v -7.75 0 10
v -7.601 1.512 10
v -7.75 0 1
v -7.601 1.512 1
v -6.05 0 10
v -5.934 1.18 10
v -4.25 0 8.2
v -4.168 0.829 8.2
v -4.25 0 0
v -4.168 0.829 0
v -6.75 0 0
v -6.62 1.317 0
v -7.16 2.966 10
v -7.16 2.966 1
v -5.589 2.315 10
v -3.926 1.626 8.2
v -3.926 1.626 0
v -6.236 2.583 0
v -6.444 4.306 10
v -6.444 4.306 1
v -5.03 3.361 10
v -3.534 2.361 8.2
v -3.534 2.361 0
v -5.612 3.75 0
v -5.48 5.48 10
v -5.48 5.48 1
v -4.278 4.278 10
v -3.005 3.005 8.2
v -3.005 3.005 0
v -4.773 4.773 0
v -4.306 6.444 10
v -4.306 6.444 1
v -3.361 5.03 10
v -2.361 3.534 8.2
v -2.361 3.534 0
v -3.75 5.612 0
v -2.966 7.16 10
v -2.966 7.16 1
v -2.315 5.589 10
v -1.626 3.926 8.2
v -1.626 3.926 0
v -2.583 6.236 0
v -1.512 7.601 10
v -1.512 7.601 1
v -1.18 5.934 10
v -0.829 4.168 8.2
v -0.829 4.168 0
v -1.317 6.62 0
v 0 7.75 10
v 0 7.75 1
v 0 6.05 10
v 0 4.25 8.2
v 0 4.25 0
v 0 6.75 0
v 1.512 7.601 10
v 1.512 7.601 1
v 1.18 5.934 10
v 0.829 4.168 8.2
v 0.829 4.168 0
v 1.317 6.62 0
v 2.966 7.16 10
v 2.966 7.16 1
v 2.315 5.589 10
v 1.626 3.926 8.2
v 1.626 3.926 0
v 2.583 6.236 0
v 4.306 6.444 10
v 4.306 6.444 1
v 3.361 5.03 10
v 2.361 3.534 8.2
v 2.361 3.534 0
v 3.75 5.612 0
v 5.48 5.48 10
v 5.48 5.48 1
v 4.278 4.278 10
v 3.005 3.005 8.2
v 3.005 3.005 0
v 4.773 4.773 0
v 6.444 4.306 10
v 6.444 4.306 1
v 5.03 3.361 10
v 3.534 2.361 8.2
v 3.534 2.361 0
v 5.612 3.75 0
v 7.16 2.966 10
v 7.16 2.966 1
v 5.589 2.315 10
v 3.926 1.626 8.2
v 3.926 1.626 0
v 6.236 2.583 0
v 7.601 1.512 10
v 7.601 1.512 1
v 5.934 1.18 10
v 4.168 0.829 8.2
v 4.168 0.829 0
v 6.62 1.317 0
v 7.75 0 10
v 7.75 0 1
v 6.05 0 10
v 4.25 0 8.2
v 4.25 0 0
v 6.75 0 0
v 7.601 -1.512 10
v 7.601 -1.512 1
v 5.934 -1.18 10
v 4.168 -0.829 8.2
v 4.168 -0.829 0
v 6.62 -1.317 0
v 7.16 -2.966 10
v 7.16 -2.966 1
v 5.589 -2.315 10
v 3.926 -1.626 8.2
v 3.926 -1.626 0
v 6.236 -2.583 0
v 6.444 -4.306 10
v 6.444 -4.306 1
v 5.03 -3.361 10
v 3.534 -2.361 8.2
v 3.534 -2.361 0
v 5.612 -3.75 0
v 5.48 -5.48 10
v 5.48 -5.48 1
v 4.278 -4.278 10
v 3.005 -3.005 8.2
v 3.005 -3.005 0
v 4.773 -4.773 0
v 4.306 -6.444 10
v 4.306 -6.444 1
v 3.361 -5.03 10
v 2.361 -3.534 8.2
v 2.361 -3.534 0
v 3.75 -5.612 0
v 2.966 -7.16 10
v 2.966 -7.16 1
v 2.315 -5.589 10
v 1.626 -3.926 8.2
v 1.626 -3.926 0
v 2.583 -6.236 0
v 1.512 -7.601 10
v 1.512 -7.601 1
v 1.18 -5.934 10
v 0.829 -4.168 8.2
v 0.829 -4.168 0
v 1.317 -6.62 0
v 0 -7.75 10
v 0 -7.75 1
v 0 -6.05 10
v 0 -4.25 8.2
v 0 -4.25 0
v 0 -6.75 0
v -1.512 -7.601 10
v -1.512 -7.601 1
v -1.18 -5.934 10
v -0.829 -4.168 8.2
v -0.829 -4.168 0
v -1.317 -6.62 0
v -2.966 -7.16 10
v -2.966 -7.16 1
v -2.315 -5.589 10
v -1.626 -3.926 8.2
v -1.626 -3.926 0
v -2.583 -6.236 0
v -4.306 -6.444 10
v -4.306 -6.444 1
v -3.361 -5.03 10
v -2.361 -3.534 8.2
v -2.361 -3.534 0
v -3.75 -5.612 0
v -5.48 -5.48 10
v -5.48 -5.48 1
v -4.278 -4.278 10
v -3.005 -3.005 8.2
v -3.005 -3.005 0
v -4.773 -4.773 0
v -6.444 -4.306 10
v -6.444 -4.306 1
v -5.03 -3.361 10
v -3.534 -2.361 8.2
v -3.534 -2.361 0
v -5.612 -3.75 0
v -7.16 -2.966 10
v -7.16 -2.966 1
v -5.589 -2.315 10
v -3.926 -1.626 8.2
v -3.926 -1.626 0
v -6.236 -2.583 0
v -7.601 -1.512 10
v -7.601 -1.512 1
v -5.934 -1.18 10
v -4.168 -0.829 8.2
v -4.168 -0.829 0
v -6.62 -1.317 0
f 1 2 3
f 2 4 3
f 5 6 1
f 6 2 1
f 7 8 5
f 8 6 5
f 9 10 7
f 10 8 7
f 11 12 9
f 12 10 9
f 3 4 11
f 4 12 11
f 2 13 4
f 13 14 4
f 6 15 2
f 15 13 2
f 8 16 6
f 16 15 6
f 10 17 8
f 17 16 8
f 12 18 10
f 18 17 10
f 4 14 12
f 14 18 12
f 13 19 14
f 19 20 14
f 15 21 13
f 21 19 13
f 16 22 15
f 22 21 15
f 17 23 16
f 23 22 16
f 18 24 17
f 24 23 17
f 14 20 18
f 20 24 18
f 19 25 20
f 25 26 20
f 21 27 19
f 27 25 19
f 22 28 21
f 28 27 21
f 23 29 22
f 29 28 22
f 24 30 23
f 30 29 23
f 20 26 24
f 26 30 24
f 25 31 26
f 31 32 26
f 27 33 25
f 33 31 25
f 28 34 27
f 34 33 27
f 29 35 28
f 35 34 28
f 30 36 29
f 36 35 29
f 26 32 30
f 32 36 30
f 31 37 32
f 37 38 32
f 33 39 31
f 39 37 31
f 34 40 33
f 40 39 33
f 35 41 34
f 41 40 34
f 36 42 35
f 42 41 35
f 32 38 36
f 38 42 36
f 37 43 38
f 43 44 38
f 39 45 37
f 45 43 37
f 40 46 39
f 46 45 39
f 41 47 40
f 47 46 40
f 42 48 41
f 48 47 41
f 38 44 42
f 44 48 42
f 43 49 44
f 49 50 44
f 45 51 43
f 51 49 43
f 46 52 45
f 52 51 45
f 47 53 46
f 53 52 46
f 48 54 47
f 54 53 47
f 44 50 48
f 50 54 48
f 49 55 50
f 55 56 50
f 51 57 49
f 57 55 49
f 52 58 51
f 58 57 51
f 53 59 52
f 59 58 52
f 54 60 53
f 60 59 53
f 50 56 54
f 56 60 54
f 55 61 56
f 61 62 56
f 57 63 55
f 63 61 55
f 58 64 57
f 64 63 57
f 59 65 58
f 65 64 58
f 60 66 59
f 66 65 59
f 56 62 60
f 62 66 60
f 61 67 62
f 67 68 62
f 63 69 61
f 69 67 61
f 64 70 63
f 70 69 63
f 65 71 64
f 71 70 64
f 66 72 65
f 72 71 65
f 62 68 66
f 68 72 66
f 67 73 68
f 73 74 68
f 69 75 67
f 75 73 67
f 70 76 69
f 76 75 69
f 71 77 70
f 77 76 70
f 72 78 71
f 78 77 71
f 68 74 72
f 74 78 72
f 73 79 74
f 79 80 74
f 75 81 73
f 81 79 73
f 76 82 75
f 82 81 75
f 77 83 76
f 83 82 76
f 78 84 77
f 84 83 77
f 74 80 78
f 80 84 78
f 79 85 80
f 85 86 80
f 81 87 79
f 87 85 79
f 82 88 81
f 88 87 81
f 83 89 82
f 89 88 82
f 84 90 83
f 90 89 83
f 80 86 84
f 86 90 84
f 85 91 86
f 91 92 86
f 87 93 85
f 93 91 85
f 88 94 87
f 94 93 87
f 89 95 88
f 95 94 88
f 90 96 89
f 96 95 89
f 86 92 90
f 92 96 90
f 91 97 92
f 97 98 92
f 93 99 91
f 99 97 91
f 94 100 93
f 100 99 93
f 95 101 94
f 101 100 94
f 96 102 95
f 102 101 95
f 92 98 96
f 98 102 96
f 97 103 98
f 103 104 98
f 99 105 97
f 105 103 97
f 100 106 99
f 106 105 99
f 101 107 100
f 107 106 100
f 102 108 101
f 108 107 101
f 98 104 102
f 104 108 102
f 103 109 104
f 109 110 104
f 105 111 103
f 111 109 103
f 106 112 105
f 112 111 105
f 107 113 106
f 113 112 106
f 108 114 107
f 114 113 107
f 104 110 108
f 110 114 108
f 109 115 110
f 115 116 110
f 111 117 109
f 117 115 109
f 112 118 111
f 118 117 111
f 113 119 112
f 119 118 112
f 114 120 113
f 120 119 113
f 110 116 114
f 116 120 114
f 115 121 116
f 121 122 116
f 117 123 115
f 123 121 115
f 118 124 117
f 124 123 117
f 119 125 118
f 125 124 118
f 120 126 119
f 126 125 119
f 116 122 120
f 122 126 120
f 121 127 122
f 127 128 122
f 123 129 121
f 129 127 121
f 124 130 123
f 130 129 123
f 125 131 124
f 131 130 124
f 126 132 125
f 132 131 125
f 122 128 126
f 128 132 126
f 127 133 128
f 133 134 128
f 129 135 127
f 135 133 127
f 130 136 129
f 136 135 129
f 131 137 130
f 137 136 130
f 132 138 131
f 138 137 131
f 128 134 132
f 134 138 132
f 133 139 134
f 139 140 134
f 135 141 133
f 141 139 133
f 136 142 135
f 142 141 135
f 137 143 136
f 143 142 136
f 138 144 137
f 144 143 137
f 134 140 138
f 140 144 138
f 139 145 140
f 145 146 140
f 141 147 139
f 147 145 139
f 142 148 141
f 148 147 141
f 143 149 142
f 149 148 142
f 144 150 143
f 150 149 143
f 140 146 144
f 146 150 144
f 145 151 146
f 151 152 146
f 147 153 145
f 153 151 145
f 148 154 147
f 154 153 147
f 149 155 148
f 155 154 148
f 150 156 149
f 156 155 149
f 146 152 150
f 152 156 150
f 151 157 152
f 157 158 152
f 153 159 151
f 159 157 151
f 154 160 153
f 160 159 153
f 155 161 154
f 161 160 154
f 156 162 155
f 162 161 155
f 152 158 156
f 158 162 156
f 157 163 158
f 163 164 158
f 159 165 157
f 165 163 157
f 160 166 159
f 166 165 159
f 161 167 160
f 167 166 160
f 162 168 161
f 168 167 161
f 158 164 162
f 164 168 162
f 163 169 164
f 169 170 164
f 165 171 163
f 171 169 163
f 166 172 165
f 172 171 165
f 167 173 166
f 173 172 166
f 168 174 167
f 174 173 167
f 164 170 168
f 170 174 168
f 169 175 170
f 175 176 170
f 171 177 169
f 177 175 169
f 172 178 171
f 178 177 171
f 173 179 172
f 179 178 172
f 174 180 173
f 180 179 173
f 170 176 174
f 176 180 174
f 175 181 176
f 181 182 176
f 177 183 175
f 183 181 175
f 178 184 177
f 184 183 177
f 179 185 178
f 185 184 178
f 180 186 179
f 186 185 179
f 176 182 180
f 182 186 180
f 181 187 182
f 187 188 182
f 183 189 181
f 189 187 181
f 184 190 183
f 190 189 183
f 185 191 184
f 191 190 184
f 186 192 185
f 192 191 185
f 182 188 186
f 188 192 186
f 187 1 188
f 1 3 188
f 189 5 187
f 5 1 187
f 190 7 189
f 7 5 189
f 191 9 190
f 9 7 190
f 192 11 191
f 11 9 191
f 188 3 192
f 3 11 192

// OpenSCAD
$fn = 32;

// ----------------------------------------------------------------------
// Form washer: countersunk washer, 15.5 mm outside, 8.5 mm bore
// ----------------------------------------------------------------------

// --- parameters (mm) ---
revolve_angle = 360;      // full turn around the Z axis
profile_points = 6;       // points of the closed outline

profile = [[4.25, 0], [6.75, 0], [7.75, 1], [7.75, 10], [6.05, 10], [4.25, 8.2]];  // single closed polygon, 6 points, counter clockwise

// --- the one profile operation ---
rotate_extrude(angle = revolve_angle) polygon(points = profile);
